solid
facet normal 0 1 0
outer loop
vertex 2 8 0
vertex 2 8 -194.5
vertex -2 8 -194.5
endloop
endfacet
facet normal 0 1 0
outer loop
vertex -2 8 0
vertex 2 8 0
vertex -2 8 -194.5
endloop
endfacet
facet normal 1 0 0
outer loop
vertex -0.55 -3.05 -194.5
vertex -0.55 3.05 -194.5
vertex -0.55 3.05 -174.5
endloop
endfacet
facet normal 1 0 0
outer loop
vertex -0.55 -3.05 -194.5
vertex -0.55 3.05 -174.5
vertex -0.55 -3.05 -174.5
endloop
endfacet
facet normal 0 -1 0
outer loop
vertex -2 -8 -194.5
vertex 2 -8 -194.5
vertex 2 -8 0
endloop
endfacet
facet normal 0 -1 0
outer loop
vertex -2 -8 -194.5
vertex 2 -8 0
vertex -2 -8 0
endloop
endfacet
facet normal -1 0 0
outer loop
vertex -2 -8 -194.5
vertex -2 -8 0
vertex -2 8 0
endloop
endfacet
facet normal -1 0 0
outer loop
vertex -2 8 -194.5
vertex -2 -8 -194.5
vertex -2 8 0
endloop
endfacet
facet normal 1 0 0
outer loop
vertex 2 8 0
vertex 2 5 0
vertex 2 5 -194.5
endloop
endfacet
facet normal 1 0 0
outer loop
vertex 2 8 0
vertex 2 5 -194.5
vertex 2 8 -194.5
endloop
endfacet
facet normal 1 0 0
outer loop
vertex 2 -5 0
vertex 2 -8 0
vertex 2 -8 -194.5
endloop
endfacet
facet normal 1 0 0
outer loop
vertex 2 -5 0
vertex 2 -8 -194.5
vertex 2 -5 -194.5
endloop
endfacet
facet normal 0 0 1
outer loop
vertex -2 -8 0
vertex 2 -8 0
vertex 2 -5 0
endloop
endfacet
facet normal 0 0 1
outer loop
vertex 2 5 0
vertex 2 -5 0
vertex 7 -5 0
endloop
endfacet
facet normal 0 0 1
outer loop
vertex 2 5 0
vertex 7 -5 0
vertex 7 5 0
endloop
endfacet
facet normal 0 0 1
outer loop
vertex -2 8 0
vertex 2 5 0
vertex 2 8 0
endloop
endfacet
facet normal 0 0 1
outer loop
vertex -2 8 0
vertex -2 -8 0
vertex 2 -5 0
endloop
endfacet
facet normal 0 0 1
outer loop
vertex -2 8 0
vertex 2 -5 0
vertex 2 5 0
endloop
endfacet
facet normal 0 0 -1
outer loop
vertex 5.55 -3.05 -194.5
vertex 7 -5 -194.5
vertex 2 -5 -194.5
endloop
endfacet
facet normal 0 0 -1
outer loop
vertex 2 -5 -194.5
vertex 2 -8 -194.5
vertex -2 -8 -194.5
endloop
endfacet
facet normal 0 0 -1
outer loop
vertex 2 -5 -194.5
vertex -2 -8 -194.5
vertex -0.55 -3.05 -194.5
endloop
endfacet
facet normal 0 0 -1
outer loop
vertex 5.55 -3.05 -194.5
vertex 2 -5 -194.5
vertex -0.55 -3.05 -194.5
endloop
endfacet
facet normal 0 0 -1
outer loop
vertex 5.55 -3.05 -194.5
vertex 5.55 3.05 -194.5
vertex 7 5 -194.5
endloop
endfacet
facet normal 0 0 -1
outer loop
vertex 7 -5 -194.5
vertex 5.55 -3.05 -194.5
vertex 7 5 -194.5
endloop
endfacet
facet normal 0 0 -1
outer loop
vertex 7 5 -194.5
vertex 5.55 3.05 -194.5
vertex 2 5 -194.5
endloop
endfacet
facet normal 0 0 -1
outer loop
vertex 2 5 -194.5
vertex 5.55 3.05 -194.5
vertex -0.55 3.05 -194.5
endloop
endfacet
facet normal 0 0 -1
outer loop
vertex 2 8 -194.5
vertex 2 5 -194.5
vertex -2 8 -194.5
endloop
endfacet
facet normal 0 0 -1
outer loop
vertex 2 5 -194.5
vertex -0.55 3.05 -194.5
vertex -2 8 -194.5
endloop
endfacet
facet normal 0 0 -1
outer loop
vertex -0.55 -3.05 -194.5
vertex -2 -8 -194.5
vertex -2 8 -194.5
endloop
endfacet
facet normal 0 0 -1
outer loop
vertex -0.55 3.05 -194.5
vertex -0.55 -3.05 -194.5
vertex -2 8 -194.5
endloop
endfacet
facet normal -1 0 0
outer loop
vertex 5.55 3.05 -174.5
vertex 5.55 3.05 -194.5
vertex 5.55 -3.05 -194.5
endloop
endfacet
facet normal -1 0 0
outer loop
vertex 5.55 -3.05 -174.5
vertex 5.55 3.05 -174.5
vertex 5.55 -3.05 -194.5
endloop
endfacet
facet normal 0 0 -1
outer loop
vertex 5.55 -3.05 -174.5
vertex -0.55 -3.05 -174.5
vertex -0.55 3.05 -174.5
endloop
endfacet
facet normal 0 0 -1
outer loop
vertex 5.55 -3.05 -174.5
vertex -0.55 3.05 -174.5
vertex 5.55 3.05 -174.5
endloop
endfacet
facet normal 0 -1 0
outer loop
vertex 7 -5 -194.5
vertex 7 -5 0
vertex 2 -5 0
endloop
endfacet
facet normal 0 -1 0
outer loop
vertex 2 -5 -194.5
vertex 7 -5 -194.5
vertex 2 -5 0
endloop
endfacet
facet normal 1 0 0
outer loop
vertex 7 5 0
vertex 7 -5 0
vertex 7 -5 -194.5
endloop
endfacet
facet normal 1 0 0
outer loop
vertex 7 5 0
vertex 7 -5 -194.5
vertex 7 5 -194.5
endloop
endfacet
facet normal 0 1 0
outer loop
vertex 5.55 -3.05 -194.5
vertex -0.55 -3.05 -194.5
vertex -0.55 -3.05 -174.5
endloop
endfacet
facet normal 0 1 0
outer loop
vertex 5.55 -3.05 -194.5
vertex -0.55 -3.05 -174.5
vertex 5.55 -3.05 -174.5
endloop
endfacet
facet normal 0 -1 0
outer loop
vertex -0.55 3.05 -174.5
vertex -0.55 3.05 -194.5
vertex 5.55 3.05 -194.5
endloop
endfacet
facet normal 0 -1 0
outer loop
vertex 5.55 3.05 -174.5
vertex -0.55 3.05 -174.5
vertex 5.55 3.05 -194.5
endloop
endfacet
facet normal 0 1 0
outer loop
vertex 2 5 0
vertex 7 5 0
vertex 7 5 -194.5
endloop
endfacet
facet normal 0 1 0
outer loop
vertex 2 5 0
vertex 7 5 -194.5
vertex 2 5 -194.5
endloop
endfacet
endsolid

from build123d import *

# Parameters (mm, degrees)
SKETCH1_W           = 10
SKETCH1_H           = 5
SKETCH1_W_2         = 16
SKETCH1_H_2         = 4
BOSS_EXTRUDE1_DEPTH = 194.5
SKETCH2_W           = 6.1
SKETCH2_H           = 6.1
CUT_EXTRUDE1_DEPTH  = 20


with BuildPart() as part:
    # Sketch1 → Boss-Extrude1 (new body)
    with BuildSketch(Plane(origin=(0, 0, 0), x_dir=(0, 1, 0), z_dir=(0, 0, 1))):
        with Locations((0, -4.5)):
            Rectangle(SKETCH1_W, SKETCH1_H)
        Rectangle(SKETCH1_W_2, SKETCH1_H_2)
    extrude(amount=-BOSS_EXTRUDE1_DEPTH)

    # Sketch2 → Cut-Extrude1 (cut)
    with BuildSketch(Plane(origin=(0, 0, -194.5), x_dir=(1, 0, 0), z_dir=(0, 0, -1))):
        with Locations((2.5, 0)):
            Rectangle(SKETCH2_W, SKETCH2_H)
    extrude(amount=-CUT_EXTRUDE1_DEPTH, mode=Mode.SUBTRACT)


solid = part.part
